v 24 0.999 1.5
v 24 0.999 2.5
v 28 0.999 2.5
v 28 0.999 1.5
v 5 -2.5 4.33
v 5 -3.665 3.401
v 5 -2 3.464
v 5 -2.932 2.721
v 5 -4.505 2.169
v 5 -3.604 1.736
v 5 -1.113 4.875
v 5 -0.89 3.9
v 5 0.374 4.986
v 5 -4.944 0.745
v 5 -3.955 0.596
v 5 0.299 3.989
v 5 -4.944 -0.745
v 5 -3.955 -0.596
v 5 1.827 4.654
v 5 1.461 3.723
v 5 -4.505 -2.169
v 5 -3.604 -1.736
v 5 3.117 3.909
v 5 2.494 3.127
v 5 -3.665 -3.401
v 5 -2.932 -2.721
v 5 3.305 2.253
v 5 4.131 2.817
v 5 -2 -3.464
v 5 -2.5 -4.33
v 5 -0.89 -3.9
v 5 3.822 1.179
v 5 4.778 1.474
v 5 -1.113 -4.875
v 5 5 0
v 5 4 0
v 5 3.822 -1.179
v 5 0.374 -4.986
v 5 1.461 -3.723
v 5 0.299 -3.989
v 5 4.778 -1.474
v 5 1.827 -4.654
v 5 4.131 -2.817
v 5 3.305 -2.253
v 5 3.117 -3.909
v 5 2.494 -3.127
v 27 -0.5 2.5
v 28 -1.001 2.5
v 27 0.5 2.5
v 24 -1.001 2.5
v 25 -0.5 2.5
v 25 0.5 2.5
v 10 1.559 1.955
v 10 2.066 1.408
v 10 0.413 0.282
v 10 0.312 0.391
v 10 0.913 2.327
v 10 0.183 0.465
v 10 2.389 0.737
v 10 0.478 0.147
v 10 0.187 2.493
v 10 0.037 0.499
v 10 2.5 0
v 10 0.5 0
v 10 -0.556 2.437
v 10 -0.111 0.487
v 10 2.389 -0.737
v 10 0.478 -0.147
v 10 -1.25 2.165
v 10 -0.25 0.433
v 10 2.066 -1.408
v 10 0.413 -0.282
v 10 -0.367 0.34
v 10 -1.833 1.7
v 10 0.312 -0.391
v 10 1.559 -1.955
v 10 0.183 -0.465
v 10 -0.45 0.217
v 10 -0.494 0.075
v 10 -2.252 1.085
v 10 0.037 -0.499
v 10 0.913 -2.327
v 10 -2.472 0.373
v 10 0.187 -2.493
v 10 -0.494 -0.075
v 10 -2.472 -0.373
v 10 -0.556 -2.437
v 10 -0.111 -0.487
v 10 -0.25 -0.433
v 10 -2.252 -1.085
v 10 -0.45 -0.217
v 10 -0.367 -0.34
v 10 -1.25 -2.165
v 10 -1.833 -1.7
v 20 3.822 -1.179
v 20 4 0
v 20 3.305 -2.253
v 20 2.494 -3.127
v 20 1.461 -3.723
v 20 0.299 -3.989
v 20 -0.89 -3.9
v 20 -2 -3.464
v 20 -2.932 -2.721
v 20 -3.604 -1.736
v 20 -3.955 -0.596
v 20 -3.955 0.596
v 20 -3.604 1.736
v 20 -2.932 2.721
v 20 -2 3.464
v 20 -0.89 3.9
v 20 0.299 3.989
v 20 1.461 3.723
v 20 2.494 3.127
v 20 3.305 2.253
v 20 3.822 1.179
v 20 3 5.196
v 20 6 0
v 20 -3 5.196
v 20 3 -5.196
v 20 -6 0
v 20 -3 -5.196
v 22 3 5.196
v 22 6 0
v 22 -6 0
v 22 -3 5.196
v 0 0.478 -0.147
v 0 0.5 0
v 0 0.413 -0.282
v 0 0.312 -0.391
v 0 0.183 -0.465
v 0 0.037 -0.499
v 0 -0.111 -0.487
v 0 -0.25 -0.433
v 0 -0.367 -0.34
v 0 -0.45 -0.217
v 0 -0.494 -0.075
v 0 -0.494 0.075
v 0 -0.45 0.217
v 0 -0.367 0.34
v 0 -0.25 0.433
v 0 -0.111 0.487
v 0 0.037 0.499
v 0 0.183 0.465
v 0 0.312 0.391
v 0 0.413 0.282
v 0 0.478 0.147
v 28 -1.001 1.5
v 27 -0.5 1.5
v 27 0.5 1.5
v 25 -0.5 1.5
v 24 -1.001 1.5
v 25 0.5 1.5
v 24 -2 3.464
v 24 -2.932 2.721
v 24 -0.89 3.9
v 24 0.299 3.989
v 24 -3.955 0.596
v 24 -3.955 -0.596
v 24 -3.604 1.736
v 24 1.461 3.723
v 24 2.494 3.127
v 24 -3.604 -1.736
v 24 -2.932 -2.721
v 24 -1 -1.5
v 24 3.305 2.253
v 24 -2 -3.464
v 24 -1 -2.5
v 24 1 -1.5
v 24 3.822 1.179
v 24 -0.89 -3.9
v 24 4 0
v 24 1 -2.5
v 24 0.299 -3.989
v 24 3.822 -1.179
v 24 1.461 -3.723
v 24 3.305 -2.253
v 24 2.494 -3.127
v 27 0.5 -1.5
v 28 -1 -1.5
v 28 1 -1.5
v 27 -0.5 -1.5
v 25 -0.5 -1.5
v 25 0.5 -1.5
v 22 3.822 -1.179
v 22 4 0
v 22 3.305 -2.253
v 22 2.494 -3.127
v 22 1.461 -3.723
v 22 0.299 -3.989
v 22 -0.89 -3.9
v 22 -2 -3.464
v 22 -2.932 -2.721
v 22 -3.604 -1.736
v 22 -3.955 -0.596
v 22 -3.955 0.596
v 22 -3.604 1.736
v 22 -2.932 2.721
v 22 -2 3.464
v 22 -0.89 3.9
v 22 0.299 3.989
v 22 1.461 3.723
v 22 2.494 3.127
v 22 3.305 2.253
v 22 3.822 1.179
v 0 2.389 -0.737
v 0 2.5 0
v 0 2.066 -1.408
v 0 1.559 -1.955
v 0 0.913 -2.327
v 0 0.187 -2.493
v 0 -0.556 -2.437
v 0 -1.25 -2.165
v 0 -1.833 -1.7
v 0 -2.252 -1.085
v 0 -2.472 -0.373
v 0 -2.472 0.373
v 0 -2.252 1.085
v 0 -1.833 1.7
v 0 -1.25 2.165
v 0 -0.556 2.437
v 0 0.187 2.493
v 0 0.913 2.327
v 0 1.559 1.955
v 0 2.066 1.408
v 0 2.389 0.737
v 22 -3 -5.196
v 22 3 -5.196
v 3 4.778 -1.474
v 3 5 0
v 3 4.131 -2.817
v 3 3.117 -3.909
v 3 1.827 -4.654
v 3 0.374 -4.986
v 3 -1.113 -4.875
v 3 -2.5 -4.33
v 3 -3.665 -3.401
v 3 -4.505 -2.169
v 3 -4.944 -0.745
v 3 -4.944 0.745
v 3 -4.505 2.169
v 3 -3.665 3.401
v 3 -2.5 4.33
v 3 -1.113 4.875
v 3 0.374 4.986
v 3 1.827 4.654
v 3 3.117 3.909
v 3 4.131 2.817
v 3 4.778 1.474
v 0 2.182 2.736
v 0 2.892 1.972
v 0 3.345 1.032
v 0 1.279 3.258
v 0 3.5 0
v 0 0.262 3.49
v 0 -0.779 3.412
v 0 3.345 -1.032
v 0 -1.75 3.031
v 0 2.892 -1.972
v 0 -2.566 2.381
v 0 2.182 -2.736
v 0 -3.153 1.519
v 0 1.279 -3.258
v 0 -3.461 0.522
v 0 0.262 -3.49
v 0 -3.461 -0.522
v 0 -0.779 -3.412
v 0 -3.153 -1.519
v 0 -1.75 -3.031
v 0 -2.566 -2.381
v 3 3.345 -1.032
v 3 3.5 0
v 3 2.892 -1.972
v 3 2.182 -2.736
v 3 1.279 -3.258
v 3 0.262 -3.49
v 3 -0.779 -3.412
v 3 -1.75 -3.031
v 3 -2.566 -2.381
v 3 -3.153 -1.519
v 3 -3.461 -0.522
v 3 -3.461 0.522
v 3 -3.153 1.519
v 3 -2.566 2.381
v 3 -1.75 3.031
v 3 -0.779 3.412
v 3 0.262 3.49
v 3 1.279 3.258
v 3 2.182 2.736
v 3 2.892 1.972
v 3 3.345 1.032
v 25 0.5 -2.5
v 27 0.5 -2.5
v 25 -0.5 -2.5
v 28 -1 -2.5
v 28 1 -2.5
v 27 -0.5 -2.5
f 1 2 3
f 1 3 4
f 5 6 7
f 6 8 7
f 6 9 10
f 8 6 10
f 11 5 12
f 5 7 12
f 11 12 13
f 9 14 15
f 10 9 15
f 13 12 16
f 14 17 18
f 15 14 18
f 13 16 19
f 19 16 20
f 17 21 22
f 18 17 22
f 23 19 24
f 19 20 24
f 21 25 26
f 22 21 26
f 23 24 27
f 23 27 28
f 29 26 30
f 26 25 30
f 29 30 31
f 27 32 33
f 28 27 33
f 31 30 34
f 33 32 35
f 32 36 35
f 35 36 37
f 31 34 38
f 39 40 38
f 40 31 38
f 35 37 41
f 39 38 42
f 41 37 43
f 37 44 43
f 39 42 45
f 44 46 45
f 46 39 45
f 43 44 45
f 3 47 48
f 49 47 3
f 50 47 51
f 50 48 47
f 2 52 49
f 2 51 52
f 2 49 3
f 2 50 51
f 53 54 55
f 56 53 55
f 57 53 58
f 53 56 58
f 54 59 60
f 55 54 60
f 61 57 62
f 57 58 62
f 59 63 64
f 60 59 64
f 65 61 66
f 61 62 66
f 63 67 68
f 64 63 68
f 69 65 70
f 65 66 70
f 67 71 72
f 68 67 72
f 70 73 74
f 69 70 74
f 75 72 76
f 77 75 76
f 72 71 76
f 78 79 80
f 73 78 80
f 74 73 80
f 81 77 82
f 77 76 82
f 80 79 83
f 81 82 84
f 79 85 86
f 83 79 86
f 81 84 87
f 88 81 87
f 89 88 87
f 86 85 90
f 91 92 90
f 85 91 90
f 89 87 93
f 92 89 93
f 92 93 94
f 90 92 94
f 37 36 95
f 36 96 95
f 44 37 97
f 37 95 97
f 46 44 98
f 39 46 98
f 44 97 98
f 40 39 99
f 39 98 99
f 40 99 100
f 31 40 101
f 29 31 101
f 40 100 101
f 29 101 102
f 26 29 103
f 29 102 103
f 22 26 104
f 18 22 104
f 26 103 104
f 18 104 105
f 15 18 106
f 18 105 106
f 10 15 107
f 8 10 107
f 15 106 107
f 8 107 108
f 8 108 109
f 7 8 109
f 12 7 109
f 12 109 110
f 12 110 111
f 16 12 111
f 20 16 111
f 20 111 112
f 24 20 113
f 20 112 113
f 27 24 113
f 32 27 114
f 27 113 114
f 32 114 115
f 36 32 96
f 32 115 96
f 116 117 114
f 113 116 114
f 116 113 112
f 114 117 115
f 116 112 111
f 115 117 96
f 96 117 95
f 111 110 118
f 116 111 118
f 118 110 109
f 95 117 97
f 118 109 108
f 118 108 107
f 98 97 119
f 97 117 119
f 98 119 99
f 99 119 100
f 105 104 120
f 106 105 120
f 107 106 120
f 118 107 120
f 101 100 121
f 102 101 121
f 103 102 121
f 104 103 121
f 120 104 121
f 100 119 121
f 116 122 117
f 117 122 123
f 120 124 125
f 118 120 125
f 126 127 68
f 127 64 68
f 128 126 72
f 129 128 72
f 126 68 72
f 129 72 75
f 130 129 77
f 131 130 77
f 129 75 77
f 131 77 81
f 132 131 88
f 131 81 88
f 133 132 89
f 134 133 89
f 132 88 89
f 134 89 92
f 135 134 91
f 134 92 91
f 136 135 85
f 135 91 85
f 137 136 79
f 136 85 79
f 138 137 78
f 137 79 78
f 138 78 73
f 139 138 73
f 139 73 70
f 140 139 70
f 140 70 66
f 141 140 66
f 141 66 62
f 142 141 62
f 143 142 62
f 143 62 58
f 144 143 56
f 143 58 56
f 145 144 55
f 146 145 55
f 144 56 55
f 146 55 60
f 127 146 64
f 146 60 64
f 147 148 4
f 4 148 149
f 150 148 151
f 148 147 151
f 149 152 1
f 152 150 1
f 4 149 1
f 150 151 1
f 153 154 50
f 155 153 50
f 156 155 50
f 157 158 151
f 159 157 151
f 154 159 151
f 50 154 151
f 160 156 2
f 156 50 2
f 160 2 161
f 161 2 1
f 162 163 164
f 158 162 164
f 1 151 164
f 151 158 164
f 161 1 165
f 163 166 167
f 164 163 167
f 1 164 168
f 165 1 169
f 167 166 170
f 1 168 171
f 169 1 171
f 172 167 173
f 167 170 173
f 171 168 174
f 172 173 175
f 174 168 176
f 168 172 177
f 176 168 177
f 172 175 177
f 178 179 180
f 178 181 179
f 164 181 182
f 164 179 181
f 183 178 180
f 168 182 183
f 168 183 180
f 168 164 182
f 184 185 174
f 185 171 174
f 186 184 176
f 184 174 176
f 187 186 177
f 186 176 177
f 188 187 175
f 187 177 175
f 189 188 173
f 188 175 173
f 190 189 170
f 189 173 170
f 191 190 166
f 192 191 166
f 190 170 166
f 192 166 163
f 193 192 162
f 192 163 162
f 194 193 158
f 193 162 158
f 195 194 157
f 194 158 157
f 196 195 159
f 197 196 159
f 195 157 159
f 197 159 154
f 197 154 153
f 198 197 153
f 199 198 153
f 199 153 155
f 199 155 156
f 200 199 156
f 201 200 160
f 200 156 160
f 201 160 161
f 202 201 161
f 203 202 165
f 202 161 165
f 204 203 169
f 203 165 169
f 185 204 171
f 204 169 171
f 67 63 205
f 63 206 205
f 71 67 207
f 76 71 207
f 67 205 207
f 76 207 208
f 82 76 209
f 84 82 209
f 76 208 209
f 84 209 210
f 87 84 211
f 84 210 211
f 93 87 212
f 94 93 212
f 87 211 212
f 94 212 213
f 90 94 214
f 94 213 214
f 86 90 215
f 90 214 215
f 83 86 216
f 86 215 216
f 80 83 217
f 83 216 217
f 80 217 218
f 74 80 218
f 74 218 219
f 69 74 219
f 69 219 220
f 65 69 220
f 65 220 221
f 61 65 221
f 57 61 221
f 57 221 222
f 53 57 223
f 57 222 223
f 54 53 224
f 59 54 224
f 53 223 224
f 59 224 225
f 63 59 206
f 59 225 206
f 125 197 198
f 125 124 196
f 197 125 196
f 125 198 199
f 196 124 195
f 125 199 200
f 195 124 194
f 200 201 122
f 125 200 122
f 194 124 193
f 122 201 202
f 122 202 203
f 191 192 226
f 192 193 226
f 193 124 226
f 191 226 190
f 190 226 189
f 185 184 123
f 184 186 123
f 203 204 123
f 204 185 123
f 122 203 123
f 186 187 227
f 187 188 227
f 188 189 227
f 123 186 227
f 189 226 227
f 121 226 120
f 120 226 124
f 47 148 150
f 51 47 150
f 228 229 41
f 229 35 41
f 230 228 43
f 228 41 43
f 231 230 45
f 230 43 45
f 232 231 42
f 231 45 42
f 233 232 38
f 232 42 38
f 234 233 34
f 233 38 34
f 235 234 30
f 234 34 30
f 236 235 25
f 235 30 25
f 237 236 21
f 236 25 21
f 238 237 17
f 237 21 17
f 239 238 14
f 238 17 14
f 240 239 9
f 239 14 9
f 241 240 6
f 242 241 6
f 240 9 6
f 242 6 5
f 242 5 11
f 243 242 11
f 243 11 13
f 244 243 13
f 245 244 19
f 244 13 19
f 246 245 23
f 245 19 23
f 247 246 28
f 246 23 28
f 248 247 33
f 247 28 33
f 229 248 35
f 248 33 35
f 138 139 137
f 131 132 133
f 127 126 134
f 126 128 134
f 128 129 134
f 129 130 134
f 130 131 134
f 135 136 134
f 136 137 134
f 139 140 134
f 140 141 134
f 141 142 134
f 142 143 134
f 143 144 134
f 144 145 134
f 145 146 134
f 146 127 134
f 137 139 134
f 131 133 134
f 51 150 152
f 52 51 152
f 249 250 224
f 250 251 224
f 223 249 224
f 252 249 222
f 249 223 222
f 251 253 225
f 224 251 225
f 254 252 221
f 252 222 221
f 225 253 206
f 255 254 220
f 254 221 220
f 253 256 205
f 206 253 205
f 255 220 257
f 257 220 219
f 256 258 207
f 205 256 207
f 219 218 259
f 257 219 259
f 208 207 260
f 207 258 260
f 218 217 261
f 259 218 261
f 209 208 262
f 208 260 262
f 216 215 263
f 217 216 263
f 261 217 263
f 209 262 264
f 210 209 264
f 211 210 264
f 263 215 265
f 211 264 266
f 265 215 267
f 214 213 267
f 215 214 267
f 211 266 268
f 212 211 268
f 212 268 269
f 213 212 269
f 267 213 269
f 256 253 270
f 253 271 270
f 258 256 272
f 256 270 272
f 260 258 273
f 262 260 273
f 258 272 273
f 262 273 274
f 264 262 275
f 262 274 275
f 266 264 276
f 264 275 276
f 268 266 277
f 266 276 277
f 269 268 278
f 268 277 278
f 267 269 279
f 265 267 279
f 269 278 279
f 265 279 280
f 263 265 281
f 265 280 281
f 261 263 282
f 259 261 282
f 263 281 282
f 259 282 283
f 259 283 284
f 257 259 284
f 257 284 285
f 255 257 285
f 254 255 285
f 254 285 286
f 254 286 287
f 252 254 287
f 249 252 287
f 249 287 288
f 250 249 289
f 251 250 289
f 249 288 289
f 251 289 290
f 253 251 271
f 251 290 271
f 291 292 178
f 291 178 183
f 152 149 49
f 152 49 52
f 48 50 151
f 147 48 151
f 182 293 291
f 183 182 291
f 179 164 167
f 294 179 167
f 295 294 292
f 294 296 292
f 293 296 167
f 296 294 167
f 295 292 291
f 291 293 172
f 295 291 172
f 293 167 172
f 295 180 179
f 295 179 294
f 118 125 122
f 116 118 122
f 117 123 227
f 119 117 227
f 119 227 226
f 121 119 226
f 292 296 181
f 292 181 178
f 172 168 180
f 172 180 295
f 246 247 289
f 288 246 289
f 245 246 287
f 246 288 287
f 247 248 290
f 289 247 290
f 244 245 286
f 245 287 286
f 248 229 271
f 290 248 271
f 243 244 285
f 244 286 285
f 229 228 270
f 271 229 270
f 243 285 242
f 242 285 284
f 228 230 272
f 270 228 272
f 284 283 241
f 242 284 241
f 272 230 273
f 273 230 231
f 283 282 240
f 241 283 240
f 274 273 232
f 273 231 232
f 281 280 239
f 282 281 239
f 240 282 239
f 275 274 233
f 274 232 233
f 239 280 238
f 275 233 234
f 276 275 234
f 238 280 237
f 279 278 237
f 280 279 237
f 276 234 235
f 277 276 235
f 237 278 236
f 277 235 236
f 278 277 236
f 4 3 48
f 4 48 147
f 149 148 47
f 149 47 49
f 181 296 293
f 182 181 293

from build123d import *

# Parameters (mm, degrees)
CORTAR_EXTRUIR2_DEPTH   = 2
CROQUIS3_W              = 1
CROQUIS3_H              = 2
SALIENTE_EXTRUIR1_DEPTH = 4
CROQUIS5_W              = 2
CROQUIS5_H              = 1
CORTAR_EXTRUIR3_DEPTH   = 10


with BuildPart() as part:
    # Croquis1 → Revolución1 (revolve)
    with BuildSketch(Plane.XY):
        Polygon((0, 0), (0, 0.5), (10, 0.5), (10, 2.5), (0, 2.5), (0, 3.5), (3, 3.5), (3, 5), (5, 5), (5, 4), (20, 4), (20, 6), (22, 6), (22, 4), (24, 4), (24, 0), align=None)
    revolve(axis=Axis((24, 0, 0), (-1, 0, 0)))

    # Croquis2 → Cortar-Extruir2 (cut)
    with BuildSketch(Plane(origin=(22, 0, 0), x_dir=(0, 0, -1), z_dir=(1, 0, 0))):
        with BuildLine():
            ThreePointArc((5.196152423, 3), (3, 5.196152423), (0, 6))
            Line((0, 6), (5.196152423, 3))
        make_face()
        with BuildLine():
            Line((-5.196152423, 3), (0, 6))
            ThreePointArc((0, 6), (-3, 5.196152423), (-5.196152423, 3))
        make_face()
        with BuildLine():
            Line((-5.196152423, -3), (-5.196152423, 3))
            ThreePointArc((-5.196152423, 3), (-6, 0), (-5.196152423, -3))
        make_face()
        with BuildLine():
            ThreePointArc((5.196152423, -3), (6, 0), (5.196152423, 3))
            Line((5.196152423, 3), (5.196152423, -3))
        make_face()
        with BuildLine():
            Line((0, -6), (-5.196152423, -3))
            ThreePointArc((-5.196152423, -3), (-3, -5.196152423), (0, -6))
        make_face()
        with BuildLine():
            ThreePointArc((0, -6), (3, -5.196152423), (5.196152423, -3))
            Line((5.196152423, -3), (0, -6))
        make_face()
    extrude(amount=-CORTAR_EXTRUIR2_DEPTH, mode=Mode.SUBTRACT)

    # Croquis3 → Saliente-Extruir1 (add)
    with BuildSketch(Plane(origin=(24, 0, 0), x_dir=(0, 0, -1), z_dir=(1, 0, 0))):
        with Locations((-2, -0.001163142)):
            Rectangle(CROQUIS3_W, CROQUIS3_H)
        with Locations((2, 0)):
            Rectangle(CROQUIS3_W, CROQUIS3_H)
    extrude(amount=SALIENTE_EXTRUIR1_DEPTH)

    # Croquis5 → Cortar-Extruir3 (cut)
    with BuildSketch(Plane(origin=(0, 0, -2.5), x_dir=(-1, 0, 0), z_dir=(0, 0, -1))):
        with Locations((-26, 0)):
            Rectangle(CROQUIS5_W, CROQUIS5_H)
    extrude(amount=-CORTAR_EXTRUIR3_DEPTH, mode=Mode.SUBTRACT)


solid = part.part
